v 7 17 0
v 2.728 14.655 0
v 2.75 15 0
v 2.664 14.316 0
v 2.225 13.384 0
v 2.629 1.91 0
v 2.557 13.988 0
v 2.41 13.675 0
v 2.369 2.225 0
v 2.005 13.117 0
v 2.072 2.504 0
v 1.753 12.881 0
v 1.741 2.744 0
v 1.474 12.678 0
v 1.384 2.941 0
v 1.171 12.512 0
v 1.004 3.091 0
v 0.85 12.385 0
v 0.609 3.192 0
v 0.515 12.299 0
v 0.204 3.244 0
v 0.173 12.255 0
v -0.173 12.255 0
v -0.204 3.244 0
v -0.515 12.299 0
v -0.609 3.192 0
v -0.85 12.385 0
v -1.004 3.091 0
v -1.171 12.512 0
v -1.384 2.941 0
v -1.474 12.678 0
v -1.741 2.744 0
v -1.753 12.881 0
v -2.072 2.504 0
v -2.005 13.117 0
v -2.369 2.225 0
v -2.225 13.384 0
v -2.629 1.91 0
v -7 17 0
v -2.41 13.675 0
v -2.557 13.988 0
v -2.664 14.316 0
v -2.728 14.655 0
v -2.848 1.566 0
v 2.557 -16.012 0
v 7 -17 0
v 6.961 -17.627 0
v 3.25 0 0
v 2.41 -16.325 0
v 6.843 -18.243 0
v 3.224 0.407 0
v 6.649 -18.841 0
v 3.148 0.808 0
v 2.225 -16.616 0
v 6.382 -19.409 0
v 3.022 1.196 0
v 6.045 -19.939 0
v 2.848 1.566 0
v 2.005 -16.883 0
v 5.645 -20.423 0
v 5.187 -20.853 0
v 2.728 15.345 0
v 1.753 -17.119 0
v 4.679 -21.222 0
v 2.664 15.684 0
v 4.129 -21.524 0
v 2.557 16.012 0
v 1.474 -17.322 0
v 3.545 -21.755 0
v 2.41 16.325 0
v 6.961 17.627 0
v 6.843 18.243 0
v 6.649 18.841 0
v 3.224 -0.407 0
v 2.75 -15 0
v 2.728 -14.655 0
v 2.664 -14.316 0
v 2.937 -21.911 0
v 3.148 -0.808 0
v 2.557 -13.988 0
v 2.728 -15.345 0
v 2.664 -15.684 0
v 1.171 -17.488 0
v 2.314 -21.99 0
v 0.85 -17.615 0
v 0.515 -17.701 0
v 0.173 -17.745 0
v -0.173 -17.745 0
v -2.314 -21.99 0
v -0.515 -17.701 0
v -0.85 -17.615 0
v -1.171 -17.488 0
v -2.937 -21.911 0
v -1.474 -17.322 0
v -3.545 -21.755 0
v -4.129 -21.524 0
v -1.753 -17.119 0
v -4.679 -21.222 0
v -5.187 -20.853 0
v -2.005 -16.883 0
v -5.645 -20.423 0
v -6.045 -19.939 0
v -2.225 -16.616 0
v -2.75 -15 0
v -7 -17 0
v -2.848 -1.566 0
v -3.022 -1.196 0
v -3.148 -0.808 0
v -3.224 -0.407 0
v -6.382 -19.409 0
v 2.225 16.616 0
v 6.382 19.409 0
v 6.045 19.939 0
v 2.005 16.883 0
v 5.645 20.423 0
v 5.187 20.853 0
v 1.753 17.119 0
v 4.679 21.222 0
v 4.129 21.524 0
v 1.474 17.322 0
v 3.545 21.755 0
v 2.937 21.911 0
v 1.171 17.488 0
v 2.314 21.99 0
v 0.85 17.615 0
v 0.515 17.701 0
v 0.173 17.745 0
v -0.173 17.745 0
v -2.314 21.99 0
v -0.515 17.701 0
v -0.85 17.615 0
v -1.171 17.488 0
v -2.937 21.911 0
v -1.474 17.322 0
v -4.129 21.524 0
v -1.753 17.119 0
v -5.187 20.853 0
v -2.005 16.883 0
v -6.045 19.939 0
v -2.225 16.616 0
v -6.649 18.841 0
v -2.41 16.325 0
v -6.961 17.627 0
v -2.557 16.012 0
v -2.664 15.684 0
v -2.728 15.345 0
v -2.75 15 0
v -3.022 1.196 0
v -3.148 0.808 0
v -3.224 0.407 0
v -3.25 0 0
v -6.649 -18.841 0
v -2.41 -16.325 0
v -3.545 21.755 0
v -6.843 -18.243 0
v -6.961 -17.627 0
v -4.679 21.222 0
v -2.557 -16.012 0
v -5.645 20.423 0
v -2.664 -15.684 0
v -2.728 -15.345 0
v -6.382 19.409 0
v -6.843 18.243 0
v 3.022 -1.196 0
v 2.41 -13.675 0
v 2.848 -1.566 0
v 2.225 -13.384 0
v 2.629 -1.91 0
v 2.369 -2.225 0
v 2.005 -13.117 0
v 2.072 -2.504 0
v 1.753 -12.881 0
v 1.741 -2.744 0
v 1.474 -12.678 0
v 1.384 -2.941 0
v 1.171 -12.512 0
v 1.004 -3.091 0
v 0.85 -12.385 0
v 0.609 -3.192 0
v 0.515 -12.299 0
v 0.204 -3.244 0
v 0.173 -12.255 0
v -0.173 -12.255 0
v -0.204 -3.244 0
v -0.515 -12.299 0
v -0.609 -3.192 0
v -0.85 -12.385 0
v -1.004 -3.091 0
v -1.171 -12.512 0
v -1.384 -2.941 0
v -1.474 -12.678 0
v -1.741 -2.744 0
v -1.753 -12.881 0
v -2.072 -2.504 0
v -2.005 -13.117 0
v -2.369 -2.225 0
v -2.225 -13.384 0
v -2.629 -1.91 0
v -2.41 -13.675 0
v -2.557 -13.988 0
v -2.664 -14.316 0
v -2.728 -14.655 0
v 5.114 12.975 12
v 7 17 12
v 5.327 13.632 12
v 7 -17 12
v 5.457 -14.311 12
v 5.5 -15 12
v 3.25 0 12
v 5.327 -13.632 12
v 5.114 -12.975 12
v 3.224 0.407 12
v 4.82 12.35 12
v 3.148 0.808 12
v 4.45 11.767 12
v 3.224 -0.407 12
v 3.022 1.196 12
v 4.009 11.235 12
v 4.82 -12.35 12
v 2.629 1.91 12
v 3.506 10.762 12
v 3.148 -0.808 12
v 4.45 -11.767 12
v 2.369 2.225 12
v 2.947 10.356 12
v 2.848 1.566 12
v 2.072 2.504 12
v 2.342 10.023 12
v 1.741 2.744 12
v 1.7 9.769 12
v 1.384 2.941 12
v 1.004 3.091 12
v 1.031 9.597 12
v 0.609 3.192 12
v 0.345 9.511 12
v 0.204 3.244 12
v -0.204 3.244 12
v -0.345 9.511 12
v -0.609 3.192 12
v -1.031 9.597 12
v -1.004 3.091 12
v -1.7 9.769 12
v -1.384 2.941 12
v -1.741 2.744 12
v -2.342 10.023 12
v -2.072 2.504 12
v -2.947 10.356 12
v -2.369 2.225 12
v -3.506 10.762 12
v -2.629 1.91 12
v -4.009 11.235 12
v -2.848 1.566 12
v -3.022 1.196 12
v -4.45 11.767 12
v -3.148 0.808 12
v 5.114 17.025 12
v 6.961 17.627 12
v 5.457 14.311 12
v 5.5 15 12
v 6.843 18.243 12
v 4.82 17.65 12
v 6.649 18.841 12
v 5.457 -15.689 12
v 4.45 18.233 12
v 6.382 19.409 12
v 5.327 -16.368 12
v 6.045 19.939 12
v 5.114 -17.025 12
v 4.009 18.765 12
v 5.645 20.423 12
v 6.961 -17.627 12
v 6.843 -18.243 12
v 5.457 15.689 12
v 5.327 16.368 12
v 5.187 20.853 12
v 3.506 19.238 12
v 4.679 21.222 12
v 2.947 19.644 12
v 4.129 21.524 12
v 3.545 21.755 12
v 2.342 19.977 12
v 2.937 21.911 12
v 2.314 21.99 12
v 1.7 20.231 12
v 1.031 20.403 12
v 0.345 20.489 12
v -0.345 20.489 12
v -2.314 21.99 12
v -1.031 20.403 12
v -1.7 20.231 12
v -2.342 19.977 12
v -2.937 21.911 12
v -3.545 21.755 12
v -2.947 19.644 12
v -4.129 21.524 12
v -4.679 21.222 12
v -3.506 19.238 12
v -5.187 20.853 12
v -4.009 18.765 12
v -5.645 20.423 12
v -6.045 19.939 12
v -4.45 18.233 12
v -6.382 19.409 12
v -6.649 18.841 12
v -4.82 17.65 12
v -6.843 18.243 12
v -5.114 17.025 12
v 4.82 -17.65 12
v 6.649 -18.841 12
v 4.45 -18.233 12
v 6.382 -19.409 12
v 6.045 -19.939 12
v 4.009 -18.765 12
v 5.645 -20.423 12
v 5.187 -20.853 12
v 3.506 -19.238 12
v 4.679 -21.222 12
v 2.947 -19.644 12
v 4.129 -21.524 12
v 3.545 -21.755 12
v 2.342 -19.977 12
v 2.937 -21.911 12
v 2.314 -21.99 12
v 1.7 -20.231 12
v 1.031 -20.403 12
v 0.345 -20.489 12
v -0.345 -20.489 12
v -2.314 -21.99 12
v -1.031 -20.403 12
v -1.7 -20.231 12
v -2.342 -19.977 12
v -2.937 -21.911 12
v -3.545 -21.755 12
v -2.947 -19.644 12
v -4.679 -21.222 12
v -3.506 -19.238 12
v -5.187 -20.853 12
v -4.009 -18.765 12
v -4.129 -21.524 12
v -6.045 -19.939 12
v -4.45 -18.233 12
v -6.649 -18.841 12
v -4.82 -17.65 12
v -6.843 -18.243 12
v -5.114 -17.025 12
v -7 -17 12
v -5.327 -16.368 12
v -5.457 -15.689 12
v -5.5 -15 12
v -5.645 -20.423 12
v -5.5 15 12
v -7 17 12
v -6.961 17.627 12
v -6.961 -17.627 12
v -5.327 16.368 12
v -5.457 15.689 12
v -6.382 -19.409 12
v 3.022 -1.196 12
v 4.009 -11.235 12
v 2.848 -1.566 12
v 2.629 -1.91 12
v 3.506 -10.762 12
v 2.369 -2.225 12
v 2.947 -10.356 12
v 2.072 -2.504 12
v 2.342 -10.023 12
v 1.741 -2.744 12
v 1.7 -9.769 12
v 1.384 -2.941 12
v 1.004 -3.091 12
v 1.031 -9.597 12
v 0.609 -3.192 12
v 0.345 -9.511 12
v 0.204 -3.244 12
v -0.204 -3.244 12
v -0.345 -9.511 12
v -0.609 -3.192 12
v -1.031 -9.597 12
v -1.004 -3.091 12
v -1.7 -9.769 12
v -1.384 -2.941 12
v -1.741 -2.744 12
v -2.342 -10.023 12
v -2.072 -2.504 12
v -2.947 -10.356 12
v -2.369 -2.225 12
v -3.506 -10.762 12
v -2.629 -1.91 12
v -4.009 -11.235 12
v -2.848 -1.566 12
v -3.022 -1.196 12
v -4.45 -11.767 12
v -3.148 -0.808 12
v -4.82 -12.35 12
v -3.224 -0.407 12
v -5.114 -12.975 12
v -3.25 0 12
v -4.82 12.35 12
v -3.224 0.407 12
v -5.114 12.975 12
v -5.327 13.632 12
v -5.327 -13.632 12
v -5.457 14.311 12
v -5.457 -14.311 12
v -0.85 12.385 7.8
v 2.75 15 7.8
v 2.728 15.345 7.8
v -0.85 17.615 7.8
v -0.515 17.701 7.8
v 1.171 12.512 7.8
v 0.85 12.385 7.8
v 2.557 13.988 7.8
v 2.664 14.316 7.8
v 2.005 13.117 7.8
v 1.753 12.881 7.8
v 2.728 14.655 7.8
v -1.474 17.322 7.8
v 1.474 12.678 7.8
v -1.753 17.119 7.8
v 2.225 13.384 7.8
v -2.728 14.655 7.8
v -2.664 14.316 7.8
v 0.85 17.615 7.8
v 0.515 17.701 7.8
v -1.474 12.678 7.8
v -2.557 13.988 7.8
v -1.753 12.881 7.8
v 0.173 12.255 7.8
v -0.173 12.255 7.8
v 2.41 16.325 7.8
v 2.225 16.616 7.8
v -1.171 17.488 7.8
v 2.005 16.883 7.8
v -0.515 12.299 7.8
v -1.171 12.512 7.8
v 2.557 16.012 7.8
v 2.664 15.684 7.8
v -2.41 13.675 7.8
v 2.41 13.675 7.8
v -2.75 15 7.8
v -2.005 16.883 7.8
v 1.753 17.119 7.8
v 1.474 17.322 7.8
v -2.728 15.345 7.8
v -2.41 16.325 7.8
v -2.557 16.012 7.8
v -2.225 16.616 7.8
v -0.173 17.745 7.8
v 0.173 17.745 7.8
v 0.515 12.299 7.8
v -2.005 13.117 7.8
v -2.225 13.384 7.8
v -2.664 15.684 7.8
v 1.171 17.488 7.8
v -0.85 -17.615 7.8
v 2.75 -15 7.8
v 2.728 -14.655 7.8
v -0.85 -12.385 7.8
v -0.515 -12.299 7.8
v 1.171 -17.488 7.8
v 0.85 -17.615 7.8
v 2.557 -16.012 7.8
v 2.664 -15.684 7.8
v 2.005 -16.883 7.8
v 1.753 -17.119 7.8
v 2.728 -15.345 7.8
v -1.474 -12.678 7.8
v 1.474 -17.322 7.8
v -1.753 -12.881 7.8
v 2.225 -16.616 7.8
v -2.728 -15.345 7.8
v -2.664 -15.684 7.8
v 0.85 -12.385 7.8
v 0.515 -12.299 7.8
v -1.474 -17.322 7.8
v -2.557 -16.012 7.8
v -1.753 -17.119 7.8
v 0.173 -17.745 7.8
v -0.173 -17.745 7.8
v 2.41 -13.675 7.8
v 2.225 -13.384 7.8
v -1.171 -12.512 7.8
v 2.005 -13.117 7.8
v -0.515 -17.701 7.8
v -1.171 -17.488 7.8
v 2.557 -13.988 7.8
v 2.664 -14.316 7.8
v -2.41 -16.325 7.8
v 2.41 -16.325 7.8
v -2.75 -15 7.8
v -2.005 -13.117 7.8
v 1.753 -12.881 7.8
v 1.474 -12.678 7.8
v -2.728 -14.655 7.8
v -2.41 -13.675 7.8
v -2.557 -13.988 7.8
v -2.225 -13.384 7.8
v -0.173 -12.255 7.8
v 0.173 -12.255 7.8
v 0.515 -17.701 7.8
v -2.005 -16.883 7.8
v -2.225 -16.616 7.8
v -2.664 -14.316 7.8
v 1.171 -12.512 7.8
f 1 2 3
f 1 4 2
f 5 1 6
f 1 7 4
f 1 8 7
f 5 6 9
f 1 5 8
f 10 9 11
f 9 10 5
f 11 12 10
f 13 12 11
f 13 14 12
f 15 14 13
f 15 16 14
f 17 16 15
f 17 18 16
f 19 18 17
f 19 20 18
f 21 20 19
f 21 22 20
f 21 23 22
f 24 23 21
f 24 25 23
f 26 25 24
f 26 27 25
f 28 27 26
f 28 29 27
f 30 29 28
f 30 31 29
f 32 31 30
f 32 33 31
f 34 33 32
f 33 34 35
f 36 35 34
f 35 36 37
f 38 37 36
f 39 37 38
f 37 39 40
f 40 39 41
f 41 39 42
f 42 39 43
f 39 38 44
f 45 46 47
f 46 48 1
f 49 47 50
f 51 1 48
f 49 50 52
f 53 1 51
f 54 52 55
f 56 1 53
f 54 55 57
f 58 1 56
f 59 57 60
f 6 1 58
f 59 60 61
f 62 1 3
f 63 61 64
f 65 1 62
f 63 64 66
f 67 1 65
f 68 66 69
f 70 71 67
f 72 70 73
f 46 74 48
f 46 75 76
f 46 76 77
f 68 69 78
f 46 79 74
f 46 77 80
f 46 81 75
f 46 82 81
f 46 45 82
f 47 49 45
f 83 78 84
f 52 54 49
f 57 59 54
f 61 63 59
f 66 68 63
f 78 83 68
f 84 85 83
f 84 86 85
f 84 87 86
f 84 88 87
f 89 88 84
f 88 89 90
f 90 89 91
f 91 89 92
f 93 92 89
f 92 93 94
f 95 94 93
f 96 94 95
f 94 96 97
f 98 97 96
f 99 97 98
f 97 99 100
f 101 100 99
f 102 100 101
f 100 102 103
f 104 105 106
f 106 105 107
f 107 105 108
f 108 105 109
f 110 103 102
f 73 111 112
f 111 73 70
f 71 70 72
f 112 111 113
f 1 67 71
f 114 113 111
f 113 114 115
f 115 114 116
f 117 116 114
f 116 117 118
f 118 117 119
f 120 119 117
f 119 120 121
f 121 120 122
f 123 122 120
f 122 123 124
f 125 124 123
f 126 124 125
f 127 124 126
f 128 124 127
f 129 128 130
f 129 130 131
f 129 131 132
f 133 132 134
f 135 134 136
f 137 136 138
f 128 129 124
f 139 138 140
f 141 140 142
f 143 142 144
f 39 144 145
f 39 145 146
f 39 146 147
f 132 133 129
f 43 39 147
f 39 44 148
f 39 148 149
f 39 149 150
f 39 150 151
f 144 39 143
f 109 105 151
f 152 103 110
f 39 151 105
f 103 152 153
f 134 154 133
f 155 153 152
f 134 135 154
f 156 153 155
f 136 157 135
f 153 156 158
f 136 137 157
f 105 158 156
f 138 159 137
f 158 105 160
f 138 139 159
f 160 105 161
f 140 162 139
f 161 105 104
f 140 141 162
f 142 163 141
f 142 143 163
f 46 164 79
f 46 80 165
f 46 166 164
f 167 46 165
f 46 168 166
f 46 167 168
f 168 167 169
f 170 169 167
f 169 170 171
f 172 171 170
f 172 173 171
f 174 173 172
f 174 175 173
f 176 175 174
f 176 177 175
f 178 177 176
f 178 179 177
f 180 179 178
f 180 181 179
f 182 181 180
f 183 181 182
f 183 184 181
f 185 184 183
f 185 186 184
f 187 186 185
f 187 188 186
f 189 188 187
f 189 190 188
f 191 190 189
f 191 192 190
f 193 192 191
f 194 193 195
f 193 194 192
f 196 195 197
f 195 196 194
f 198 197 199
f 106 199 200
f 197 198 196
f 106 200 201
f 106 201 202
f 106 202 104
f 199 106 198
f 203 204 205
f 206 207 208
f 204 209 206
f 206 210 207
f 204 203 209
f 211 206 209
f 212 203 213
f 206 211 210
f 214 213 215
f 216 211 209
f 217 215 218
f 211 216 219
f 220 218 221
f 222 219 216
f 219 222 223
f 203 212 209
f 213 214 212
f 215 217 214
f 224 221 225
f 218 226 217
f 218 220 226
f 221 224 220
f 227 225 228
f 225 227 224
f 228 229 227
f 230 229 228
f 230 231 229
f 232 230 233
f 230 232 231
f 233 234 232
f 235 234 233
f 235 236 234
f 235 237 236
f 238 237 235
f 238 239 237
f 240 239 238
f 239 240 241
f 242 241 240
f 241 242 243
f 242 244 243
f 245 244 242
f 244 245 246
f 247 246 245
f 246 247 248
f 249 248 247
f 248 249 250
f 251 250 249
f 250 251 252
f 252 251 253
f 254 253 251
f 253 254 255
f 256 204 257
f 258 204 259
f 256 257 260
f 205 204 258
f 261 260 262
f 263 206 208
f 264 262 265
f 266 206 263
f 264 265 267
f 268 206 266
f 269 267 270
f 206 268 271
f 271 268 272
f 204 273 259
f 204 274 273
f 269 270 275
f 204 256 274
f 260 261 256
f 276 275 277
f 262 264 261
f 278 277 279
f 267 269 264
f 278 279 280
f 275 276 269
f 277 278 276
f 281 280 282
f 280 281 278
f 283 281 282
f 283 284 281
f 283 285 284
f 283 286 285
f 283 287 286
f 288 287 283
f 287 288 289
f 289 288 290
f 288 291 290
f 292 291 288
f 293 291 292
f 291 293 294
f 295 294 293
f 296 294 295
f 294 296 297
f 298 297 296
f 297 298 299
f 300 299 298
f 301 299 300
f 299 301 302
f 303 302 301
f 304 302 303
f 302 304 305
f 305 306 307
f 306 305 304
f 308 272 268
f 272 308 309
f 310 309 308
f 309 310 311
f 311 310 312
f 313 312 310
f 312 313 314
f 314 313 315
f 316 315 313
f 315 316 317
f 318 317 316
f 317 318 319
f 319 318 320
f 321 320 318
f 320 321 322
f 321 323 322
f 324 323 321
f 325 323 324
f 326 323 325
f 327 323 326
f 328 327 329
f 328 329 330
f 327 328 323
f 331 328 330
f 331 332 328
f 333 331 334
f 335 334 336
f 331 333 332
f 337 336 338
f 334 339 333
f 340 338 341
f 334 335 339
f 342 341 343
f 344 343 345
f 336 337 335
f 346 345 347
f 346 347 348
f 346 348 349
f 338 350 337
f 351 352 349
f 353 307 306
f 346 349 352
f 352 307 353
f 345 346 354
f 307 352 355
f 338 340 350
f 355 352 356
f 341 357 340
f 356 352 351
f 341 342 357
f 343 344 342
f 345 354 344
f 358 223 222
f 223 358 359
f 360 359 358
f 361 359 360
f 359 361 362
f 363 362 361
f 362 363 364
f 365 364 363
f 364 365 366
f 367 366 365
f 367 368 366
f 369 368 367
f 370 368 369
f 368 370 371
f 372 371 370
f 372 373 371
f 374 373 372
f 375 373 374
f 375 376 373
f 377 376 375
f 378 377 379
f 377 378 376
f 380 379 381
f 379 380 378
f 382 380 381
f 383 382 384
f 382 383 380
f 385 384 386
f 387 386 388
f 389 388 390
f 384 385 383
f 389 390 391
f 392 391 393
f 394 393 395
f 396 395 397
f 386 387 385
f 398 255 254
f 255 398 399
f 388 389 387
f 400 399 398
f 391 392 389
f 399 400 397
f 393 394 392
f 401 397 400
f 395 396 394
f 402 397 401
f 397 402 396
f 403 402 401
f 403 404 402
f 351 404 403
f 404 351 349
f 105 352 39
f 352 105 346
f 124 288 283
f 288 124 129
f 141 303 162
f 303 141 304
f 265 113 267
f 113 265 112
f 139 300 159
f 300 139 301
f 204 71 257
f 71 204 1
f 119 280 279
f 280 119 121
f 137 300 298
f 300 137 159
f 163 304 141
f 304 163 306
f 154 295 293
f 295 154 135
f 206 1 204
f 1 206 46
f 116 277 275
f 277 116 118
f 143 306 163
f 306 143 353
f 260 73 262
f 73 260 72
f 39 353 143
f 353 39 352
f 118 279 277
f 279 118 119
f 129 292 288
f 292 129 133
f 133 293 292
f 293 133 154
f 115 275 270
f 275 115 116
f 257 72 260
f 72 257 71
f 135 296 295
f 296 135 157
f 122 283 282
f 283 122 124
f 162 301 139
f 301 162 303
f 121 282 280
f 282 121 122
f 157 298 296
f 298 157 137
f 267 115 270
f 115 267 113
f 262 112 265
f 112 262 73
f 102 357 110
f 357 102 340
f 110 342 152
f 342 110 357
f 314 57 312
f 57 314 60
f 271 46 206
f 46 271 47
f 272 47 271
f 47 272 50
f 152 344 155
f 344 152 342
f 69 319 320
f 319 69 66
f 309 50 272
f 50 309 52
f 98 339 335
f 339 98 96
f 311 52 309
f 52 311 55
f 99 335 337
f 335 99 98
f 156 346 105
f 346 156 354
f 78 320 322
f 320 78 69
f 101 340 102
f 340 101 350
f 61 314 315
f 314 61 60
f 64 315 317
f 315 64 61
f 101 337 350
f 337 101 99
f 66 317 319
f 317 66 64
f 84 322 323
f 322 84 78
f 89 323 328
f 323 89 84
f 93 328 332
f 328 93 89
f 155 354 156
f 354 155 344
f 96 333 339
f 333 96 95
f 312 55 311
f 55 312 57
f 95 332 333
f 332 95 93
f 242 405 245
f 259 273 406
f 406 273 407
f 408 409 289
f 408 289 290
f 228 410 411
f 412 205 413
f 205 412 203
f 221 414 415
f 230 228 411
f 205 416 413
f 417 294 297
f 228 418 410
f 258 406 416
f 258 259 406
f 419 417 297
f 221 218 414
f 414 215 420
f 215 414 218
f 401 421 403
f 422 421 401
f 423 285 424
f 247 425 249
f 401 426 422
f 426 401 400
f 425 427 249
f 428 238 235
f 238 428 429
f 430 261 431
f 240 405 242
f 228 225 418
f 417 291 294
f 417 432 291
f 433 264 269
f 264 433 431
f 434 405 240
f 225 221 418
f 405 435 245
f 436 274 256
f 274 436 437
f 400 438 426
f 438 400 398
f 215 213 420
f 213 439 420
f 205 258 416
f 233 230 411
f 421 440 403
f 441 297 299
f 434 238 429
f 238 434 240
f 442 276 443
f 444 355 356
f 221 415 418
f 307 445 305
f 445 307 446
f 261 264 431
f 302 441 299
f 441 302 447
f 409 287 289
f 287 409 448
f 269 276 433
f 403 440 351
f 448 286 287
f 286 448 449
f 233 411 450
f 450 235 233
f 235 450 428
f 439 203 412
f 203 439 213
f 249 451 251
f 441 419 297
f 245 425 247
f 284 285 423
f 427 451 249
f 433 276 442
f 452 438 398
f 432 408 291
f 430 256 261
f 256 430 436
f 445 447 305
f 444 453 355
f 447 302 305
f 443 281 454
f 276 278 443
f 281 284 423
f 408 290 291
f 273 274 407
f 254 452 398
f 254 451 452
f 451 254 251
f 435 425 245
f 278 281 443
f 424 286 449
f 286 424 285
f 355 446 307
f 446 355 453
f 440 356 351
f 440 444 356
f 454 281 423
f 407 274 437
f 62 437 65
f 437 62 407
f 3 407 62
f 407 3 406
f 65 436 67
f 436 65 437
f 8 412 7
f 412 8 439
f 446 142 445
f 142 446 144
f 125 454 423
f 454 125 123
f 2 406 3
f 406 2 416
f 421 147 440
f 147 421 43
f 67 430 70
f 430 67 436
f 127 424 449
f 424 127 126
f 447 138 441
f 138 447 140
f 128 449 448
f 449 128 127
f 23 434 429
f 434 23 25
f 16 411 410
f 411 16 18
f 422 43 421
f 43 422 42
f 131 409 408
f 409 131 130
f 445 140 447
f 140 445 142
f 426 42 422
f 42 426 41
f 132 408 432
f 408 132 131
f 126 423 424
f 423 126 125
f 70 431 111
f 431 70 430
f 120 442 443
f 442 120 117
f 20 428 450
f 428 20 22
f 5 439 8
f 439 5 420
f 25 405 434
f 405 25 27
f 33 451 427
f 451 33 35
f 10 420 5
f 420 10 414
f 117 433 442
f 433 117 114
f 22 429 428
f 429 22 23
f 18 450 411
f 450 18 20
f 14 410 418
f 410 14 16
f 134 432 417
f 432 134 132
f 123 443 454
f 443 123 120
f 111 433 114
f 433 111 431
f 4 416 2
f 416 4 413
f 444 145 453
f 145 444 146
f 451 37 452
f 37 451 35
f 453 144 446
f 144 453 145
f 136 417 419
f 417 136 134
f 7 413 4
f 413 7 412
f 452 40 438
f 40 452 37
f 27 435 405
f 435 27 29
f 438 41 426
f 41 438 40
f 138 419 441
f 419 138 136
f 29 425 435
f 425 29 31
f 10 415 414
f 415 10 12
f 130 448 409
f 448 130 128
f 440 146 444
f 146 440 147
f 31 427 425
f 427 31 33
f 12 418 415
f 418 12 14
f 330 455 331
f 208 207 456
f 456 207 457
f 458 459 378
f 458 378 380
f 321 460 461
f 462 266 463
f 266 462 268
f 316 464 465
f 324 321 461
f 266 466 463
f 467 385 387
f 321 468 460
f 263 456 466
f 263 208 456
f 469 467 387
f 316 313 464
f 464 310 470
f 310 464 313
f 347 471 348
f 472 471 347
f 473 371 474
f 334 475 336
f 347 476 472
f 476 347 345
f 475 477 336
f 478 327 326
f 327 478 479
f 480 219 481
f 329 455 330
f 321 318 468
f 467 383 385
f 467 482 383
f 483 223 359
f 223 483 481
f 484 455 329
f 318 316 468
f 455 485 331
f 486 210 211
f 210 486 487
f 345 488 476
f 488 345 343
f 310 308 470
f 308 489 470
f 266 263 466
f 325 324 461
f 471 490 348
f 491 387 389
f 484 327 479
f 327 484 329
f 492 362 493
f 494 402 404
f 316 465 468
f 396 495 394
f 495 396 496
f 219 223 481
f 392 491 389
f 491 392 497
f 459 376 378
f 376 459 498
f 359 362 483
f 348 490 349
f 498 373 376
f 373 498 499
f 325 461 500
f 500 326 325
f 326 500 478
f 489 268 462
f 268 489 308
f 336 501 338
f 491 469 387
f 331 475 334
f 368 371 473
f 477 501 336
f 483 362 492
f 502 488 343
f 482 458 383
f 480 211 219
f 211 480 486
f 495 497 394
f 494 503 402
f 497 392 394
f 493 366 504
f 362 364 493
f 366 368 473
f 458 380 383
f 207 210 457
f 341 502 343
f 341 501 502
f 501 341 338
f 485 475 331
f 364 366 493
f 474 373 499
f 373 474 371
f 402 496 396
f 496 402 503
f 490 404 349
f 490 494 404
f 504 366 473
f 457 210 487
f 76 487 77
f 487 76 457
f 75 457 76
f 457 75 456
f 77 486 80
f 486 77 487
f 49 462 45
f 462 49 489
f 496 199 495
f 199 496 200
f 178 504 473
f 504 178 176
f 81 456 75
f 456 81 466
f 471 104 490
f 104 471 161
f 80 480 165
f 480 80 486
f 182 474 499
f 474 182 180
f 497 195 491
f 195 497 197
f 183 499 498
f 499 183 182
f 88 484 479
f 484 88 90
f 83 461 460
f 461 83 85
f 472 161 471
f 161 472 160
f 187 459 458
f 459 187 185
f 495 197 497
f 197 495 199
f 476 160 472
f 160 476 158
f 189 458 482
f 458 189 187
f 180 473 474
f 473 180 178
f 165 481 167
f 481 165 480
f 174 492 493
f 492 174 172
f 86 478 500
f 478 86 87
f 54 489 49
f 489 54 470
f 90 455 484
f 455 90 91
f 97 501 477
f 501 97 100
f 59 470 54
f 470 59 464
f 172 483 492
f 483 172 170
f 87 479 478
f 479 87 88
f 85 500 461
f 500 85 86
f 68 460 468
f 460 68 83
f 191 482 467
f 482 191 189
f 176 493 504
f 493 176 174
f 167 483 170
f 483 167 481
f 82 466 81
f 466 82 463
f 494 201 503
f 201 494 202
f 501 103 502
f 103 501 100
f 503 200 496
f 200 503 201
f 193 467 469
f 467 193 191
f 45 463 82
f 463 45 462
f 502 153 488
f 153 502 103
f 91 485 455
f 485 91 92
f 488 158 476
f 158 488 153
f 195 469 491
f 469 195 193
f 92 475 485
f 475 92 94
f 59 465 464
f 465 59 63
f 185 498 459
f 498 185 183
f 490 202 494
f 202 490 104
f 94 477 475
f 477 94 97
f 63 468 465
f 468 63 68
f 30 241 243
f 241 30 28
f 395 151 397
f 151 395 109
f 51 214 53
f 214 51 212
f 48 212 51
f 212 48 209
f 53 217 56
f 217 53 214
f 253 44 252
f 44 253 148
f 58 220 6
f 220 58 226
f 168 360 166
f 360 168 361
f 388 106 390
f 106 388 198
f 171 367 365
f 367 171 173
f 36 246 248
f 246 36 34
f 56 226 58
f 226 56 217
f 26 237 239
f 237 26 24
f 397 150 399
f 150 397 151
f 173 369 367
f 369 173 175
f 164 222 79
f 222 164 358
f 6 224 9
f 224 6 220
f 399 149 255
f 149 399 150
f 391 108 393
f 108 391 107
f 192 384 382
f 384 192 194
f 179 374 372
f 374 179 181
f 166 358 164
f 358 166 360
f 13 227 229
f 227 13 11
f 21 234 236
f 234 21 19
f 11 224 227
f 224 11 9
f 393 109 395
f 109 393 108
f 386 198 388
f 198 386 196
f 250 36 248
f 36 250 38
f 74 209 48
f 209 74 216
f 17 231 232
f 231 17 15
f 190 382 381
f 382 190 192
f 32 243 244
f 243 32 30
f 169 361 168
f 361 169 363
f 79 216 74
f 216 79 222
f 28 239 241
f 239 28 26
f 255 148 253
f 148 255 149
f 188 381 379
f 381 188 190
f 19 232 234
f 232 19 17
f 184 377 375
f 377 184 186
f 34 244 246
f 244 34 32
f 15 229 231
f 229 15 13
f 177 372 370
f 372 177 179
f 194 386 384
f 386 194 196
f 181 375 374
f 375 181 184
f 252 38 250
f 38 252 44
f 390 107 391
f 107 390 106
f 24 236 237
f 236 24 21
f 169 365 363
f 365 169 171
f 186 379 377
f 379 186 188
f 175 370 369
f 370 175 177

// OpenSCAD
$fn = 50;


difference() {
	union() {
		cylinder(h = 12, r = 7.0000000000);
		translate(v = [0.0000000000, 7.5000000000, 0]) {
			hull() {
				translate(v = [-2.0000000000, 9.5000000000, 0]) {
					cylinder(h = 12, r = 5);
				}
				translate(v = [2.0000000000, 9.5000000000, 0]) {
					cylinder(h = 12, r = 5);
				}
				translate(v = [-2.0000000000, -9.5000000000, 0]) {
					cylinder(h = 12, r = 5);
				}
				translate(v = [2.0000000000, -9.5000000000, 0]) {
					cylinder(h = 12, r = 5);
				}
			}
		}
		translate(v = [0.0000000000, 7.5000000000, 0]) {
			hull() {
				translate(v = [-2.0000000000, 9.5000000000, 0]) {
					cylinder(h = 12, r = 5);
				}
				translate(v = [2.0000000000, 9.5000000000, 0]) {
					cylinder(h = 12, r = 5);
				}
				translate(v = [-2.0000000000, -9.5000000000, 0]) {
					cylinder(h = 12, r = 5);
				}
				translate(v = [2.0000000000, -9.5000000000, 0]) {
					cylinder(h = 12, r = 5);
				}
			}
		}
		translate(v = [0.0000000000, -7.5000000000, 0]) {
			hull() {
				translate(v = [-2.0000000000, 9.5000000000, 0]) {
					cylinder(h = 12, r = 5);
				}
				translate(v = [2.0000000000, 9.5000000000, 0]) {
					cylinder(h = 12, r = 5);
				}
				translate(v = [-2.0000000000, -9.5000000000, 0]) {
					cylinder(h = 12, r = 5);
				}
				translate(v = [2.0000000000, -9.5000000000, 0]) {
					cylinder(h = 12, r = 5);
				}
			}
		}
		translate(v = [0.0000000000, -7.5000000000, 0]) {
			hull() {
				translate(v = [-2.0000000000, 9.5000000000, 0]) {
					cylinder(h = 12, r = 5);
				}
				translate(v = [2.0000000000, 9.5000000000, 0]) {
					cylinder(h = 12, r = 5);
				}
				translate(v = [-2.0000000000, -9.5000000000, 0]) {
					cylinder(h = 12, r = 5);
				}
				translate(v = [2.0000000000, -9.5000000000, 0]) {
					cylinder(h = 12, r = 5);
				}
			}
		}
	}
	union() {
		translate(v = [0.0000000000, 15.0000000000, 12]) {
			rotate(a = [0, 0, 0]) {
				difference() {
					union() {
						#translate(v = [0, 0, -12.0000000000]) {
							cylinder(h = 12, r = 2.2500000000);
						}
						#translate(v = [0, 0, -4.2000000000]) {
							cylinder(h = 4.2000000000, r1 = 2.7500000000, r2 = 5.5000000000);
						}
						#translate(v = [0, 0, -12.0000000000]) {
							cylinder(h = 12, r = 2.7500000000);
						}
						#translate(v = [0, 0, -12.0000000000]) {
							cylinder(h = 12, r = 2.2500000000);
						}
					}
					union();
				}
			}
		}
		translate(v = [0.0000000000, 15.0000000000, 12]) {
			rotate(a = [0, 0, 0]) {
				difference() {
					union() {
						#translate(v = [0, 0, -12.0000000000]) {
							cylinder(h = 12, r = 2.2500000000);
						}
						#translate(v = [0, 0, -4.2000000000]) {
							cylinder(h = 4.2000000000, r1 = 2.7500000000, r2 = 5.5000000000);
						}
						#translate(v = [0, 0, -12.0000000000]) {
							cylinder(h = 12, r = 2.7500000000);
						}
						#translate(v = [0, 0, -12.0000000000]) {
							cylinder(h = 12, r = 2.2500000000);
						}
					}
					union();
				}
			}
		}
		translate(v = [0.0000000000, -15.0000000000, 12]) {
			rotate(a = [0, 0, 0]) {
				difference() {
					union() {
						#translate(v = [0, 0, -12.0000000000]) {
							cylinder(h = 12, r = 2.2500000000);
						}
						#translate(v = [0, 0, -4.2000000000]) {
							cylinder(h = 4.2000000000, r1 = 2.7500000000, r2 = 5.5000000000);
						}
						#translate(v = [0, 0, -12.0000000000]) {
							cylinder(h = 12, r = 2.7500000000);
						}
						#translate(v = [0, 0, -12.0000000000]) {
							cylinder(h = 12, r = 2.2500000000);
						}
					}
					union();
				}
			}
		}
		translate(v = [0.0000000000, -15.0000000000, 12]) {
			rotate(a = [0, 0, 0]) {
				difference() {
					union() {
						#translate(v = [0, 0, -12.0000000000]) {
							cylinder(h = 12, r = 2.2500000000);
						}
						#translate(v = [0, 0, -4.2000000000]) {
							cylinder(h = 4.2000000000, r1 = 2.7500000000, r2 = 5.5000000000);
						}
						#translate(v = [0, 0, -12.0000000000]) {
							cylinder(h = 12, r = 2.7500000000);
						}
						#translate(v = [0, 0, -12.0000000000]) {
							cylinder(h = 12, r = 2.2500000000);
						}
					}
					union();
				}
			}
		}
		translate(v = [0, 0, -100]) {
			cylinder(h = 200, r = 3.2500000000);
		}
		translate(v = [0, 0, -100]) {
			cylinder(h = 200, r = 1.8000000000);
		}
	}
}
